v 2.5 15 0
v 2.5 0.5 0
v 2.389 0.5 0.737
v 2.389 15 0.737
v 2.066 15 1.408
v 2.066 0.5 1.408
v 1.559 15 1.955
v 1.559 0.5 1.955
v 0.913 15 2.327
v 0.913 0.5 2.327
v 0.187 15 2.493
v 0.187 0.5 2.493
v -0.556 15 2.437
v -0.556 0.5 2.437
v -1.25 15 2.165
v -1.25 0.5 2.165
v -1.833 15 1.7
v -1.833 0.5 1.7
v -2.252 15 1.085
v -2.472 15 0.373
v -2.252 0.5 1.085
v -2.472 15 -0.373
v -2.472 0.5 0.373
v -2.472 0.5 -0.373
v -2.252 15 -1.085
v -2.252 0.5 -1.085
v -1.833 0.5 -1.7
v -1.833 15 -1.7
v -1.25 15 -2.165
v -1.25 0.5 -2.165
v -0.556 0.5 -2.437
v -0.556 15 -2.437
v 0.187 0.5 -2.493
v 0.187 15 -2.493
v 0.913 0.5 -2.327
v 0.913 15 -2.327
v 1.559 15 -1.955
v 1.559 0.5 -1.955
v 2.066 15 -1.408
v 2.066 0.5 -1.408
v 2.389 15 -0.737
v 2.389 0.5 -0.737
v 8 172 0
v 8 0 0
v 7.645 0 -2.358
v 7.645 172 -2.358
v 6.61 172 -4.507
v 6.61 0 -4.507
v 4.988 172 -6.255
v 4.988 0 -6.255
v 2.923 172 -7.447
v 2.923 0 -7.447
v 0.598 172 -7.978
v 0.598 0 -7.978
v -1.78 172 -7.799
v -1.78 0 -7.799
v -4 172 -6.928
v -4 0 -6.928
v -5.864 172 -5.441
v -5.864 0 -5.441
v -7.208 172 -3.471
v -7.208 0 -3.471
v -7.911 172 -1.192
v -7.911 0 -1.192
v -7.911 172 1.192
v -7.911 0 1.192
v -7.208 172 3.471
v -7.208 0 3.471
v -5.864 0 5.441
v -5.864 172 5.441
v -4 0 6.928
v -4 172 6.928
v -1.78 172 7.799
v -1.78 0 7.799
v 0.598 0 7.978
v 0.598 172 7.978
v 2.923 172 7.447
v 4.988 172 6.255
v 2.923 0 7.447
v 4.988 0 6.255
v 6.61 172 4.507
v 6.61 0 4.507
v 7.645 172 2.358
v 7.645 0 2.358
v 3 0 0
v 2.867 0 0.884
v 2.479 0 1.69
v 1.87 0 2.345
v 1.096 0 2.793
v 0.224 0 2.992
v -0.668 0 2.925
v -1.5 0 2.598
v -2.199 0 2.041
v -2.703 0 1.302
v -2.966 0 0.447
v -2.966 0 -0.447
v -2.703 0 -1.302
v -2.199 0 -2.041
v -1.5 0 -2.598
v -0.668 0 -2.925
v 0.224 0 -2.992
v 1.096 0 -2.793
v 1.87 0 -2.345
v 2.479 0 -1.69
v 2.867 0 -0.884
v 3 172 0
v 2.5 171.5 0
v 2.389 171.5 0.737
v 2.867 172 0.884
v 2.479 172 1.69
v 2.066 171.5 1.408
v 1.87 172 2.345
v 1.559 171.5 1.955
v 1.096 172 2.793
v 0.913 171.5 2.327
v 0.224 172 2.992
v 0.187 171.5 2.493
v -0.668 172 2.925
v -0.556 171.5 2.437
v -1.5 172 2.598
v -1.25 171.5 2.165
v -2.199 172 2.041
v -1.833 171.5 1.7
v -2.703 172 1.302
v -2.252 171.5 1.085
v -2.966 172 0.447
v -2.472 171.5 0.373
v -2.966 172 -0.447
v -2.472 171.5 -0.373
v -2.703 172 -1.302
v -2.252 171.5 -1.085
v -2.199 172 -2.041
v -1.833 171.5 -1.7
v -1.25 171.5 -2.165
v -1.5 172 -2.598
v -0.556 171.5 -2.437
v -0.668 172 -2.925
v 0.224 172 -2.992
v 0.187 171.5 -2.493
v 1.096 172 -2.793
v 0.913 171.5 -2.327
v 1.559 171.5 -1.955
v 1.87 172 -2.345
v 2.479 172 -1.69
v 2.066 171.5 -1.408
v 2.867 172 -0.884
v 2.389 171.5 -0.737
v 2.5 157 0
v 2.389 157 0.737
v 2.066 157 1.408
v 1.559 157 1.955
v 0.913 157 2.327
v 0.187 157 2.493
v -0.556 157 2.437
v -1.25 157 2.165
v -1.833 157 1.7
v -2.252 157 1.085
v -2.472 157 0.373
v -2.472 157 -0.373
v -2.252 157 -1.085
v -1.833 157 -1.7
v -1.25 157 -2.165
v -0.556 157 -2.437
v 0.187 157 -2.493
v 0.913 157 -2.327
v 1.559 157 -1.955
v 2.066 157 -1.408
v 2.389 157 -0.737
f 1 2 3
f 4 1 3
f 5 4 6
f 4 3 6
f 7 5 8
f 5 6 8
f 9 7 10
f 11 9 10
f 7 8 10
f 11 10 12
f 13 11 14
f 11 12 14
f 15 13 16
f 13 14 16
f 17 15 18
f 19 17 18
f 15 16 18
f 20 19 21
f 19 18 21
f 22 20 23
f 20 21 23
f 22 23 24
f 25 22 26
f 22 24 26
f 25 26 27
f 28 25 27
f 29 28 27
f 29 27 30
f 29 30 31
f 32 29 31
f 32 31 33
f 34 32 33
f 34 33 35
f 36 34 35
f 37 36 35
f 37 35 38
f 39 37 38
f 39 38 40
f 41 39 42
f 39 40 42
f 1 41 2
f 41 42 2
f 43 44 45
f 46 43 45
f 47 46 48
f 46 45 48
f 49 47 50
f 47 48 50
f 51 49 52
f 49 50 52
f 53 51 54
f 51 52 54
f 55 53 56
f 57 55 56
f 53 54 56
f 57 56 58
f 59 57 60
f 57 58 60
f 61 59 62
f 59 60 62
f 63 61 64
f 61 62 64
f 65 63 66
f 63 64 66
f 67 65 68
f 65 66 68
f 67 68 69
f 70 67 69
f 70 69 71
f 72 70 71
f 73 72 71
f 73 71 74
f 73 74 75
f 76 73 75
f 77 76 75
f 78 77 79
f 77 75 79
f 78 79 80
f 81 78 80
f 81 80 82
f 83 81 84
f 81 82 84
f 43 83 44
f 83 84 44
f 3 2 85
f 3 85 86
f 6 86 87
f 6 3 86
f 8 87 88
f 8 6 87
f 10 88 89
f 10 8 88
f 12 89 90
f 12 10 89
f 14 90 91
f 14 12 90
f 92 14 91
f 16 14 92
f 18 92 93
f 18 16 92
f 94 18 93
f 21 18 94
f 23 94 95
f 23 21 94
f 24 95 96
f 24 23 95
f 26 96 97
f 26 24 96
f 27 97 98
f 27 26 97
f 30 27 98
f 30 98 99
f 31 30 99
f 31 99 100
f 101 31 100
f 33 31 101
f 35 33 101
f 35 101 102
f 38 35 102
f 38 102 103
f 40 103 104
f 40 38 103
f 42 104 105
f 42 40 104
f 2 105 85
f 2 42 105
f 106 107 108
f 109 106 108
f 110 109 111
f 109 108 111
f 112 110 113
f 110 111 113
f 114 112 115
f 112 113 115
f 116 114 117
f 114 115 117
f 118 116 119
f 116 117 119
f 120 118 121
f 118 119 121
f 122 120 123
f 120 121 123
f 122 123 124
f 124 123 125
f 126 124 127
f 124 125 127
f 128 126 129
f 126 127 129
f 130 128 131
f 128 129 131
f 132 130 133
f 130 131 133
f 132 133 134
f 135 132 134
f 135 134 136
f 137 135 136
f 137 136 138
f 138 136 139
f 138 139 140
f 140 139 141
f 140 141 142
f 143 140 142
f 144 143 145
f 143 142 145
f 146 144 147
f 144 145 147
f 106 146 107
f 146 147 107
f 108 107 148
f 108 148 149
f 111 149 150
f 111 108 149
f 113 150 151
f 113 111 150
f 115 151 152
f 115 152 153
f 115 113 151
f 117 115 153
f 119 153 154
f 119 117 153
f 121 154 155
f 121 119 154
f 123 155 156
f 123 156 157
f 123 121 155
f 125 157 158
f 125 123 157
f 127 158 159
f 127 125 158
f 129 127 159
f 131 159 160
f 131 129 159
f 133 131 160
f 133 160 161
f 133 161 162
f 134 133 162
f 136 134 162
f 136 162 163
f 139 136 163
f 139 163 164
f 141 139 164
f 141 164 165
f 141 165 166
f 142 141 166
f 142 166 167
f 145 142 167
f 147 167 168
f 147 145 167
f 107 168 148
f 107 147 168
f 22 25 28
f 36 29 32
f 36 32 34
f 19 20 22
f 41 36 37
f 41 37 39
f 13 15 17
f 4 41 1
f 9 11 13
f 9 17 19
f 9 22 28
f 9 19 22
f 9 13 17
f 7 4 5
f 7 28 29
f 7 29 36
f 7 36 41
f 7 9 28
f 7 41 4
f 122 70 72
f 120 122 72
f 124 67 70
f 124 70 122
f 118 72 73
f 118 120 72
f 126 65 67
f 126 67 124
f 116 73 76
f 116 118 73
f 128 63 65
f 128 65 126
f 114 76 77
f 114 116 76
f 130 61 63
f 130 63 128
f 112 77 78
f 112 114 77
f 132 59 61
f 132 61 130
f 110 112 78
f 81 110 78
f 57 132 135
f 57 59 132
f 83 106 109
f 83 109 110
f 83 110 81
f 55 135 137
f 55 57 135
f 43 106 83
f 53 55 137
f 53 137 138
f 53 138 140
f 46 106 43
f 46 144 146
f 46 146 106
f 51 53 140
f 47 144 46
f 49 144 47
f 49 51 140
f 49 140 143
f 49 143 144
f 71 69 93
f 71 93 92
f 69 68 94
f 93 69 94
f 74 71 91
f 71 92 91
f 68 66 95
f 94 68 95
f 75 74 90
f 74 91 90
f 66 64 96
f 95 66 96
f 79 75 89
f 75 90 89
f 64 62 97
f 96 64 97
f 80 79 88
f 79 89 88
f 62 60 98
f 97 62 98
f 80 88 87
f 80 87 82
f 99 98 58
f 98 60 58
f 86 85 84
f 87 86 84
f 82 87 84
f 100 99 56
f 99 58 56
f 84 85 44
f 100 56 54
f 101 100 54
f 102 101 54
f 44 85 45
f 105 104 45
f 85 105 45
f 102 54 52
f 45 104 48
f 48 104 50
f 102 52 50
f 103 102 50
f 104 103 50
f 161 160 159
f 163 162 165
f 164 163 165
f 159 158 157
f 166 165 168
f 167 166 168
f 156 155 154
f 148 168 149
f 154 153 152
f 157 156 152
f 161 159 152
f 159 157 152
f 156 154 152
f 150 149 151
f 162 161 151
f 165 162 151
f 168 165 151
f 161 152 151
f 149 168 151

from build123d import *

# Parameters (mm, degrees)
SKETCH1_R           = 8
BOSS_EXTRUDE1_DEPTH = 172
SKETCH2_R           = 2.5
CUT_EXTRUDE1_DEPTH  = 15
CHAMFER1_SIZE       = 0.5


with BuildPart() as part:
    # Sketch1 → Boss-Extrude1 (new body)
    with BuildSketch(Plane(origin=(0, 0, 0), x_dir=(1, 0, 0), z_dir=(0, 1, 0))):
        Circle(SKETCH1_R)
    extrude(amount=BOSS_EXTRUDE1_DEPTH)

    # Sketch2 → Cut-Extrude1 (cut)
    with BuildSketch(Plane.XZ):
        Circle(SKETCH2_R)
    cut_extrude1 = extrude(amount=-CUT_EXTRUDE1_DEPTH, mode=Mode.SUBTRACT)

    # Mirror1: Cut-Extrude1 across plane
    add(cut_extrude1.mirror(Plane.ZX.offset(86)), mode=Mode.SUBTRACT)

    # Chamfer1
    chamfer1_edges = [part.edges().sort_by_distance(p)[0] for p in [
        (-2.5, 0, 0),
        (-2.5, 172, 0),
    ]]
    chamfer(chamfer1_edges, length=CHAMFER1_SIZE)


solid = part.part
